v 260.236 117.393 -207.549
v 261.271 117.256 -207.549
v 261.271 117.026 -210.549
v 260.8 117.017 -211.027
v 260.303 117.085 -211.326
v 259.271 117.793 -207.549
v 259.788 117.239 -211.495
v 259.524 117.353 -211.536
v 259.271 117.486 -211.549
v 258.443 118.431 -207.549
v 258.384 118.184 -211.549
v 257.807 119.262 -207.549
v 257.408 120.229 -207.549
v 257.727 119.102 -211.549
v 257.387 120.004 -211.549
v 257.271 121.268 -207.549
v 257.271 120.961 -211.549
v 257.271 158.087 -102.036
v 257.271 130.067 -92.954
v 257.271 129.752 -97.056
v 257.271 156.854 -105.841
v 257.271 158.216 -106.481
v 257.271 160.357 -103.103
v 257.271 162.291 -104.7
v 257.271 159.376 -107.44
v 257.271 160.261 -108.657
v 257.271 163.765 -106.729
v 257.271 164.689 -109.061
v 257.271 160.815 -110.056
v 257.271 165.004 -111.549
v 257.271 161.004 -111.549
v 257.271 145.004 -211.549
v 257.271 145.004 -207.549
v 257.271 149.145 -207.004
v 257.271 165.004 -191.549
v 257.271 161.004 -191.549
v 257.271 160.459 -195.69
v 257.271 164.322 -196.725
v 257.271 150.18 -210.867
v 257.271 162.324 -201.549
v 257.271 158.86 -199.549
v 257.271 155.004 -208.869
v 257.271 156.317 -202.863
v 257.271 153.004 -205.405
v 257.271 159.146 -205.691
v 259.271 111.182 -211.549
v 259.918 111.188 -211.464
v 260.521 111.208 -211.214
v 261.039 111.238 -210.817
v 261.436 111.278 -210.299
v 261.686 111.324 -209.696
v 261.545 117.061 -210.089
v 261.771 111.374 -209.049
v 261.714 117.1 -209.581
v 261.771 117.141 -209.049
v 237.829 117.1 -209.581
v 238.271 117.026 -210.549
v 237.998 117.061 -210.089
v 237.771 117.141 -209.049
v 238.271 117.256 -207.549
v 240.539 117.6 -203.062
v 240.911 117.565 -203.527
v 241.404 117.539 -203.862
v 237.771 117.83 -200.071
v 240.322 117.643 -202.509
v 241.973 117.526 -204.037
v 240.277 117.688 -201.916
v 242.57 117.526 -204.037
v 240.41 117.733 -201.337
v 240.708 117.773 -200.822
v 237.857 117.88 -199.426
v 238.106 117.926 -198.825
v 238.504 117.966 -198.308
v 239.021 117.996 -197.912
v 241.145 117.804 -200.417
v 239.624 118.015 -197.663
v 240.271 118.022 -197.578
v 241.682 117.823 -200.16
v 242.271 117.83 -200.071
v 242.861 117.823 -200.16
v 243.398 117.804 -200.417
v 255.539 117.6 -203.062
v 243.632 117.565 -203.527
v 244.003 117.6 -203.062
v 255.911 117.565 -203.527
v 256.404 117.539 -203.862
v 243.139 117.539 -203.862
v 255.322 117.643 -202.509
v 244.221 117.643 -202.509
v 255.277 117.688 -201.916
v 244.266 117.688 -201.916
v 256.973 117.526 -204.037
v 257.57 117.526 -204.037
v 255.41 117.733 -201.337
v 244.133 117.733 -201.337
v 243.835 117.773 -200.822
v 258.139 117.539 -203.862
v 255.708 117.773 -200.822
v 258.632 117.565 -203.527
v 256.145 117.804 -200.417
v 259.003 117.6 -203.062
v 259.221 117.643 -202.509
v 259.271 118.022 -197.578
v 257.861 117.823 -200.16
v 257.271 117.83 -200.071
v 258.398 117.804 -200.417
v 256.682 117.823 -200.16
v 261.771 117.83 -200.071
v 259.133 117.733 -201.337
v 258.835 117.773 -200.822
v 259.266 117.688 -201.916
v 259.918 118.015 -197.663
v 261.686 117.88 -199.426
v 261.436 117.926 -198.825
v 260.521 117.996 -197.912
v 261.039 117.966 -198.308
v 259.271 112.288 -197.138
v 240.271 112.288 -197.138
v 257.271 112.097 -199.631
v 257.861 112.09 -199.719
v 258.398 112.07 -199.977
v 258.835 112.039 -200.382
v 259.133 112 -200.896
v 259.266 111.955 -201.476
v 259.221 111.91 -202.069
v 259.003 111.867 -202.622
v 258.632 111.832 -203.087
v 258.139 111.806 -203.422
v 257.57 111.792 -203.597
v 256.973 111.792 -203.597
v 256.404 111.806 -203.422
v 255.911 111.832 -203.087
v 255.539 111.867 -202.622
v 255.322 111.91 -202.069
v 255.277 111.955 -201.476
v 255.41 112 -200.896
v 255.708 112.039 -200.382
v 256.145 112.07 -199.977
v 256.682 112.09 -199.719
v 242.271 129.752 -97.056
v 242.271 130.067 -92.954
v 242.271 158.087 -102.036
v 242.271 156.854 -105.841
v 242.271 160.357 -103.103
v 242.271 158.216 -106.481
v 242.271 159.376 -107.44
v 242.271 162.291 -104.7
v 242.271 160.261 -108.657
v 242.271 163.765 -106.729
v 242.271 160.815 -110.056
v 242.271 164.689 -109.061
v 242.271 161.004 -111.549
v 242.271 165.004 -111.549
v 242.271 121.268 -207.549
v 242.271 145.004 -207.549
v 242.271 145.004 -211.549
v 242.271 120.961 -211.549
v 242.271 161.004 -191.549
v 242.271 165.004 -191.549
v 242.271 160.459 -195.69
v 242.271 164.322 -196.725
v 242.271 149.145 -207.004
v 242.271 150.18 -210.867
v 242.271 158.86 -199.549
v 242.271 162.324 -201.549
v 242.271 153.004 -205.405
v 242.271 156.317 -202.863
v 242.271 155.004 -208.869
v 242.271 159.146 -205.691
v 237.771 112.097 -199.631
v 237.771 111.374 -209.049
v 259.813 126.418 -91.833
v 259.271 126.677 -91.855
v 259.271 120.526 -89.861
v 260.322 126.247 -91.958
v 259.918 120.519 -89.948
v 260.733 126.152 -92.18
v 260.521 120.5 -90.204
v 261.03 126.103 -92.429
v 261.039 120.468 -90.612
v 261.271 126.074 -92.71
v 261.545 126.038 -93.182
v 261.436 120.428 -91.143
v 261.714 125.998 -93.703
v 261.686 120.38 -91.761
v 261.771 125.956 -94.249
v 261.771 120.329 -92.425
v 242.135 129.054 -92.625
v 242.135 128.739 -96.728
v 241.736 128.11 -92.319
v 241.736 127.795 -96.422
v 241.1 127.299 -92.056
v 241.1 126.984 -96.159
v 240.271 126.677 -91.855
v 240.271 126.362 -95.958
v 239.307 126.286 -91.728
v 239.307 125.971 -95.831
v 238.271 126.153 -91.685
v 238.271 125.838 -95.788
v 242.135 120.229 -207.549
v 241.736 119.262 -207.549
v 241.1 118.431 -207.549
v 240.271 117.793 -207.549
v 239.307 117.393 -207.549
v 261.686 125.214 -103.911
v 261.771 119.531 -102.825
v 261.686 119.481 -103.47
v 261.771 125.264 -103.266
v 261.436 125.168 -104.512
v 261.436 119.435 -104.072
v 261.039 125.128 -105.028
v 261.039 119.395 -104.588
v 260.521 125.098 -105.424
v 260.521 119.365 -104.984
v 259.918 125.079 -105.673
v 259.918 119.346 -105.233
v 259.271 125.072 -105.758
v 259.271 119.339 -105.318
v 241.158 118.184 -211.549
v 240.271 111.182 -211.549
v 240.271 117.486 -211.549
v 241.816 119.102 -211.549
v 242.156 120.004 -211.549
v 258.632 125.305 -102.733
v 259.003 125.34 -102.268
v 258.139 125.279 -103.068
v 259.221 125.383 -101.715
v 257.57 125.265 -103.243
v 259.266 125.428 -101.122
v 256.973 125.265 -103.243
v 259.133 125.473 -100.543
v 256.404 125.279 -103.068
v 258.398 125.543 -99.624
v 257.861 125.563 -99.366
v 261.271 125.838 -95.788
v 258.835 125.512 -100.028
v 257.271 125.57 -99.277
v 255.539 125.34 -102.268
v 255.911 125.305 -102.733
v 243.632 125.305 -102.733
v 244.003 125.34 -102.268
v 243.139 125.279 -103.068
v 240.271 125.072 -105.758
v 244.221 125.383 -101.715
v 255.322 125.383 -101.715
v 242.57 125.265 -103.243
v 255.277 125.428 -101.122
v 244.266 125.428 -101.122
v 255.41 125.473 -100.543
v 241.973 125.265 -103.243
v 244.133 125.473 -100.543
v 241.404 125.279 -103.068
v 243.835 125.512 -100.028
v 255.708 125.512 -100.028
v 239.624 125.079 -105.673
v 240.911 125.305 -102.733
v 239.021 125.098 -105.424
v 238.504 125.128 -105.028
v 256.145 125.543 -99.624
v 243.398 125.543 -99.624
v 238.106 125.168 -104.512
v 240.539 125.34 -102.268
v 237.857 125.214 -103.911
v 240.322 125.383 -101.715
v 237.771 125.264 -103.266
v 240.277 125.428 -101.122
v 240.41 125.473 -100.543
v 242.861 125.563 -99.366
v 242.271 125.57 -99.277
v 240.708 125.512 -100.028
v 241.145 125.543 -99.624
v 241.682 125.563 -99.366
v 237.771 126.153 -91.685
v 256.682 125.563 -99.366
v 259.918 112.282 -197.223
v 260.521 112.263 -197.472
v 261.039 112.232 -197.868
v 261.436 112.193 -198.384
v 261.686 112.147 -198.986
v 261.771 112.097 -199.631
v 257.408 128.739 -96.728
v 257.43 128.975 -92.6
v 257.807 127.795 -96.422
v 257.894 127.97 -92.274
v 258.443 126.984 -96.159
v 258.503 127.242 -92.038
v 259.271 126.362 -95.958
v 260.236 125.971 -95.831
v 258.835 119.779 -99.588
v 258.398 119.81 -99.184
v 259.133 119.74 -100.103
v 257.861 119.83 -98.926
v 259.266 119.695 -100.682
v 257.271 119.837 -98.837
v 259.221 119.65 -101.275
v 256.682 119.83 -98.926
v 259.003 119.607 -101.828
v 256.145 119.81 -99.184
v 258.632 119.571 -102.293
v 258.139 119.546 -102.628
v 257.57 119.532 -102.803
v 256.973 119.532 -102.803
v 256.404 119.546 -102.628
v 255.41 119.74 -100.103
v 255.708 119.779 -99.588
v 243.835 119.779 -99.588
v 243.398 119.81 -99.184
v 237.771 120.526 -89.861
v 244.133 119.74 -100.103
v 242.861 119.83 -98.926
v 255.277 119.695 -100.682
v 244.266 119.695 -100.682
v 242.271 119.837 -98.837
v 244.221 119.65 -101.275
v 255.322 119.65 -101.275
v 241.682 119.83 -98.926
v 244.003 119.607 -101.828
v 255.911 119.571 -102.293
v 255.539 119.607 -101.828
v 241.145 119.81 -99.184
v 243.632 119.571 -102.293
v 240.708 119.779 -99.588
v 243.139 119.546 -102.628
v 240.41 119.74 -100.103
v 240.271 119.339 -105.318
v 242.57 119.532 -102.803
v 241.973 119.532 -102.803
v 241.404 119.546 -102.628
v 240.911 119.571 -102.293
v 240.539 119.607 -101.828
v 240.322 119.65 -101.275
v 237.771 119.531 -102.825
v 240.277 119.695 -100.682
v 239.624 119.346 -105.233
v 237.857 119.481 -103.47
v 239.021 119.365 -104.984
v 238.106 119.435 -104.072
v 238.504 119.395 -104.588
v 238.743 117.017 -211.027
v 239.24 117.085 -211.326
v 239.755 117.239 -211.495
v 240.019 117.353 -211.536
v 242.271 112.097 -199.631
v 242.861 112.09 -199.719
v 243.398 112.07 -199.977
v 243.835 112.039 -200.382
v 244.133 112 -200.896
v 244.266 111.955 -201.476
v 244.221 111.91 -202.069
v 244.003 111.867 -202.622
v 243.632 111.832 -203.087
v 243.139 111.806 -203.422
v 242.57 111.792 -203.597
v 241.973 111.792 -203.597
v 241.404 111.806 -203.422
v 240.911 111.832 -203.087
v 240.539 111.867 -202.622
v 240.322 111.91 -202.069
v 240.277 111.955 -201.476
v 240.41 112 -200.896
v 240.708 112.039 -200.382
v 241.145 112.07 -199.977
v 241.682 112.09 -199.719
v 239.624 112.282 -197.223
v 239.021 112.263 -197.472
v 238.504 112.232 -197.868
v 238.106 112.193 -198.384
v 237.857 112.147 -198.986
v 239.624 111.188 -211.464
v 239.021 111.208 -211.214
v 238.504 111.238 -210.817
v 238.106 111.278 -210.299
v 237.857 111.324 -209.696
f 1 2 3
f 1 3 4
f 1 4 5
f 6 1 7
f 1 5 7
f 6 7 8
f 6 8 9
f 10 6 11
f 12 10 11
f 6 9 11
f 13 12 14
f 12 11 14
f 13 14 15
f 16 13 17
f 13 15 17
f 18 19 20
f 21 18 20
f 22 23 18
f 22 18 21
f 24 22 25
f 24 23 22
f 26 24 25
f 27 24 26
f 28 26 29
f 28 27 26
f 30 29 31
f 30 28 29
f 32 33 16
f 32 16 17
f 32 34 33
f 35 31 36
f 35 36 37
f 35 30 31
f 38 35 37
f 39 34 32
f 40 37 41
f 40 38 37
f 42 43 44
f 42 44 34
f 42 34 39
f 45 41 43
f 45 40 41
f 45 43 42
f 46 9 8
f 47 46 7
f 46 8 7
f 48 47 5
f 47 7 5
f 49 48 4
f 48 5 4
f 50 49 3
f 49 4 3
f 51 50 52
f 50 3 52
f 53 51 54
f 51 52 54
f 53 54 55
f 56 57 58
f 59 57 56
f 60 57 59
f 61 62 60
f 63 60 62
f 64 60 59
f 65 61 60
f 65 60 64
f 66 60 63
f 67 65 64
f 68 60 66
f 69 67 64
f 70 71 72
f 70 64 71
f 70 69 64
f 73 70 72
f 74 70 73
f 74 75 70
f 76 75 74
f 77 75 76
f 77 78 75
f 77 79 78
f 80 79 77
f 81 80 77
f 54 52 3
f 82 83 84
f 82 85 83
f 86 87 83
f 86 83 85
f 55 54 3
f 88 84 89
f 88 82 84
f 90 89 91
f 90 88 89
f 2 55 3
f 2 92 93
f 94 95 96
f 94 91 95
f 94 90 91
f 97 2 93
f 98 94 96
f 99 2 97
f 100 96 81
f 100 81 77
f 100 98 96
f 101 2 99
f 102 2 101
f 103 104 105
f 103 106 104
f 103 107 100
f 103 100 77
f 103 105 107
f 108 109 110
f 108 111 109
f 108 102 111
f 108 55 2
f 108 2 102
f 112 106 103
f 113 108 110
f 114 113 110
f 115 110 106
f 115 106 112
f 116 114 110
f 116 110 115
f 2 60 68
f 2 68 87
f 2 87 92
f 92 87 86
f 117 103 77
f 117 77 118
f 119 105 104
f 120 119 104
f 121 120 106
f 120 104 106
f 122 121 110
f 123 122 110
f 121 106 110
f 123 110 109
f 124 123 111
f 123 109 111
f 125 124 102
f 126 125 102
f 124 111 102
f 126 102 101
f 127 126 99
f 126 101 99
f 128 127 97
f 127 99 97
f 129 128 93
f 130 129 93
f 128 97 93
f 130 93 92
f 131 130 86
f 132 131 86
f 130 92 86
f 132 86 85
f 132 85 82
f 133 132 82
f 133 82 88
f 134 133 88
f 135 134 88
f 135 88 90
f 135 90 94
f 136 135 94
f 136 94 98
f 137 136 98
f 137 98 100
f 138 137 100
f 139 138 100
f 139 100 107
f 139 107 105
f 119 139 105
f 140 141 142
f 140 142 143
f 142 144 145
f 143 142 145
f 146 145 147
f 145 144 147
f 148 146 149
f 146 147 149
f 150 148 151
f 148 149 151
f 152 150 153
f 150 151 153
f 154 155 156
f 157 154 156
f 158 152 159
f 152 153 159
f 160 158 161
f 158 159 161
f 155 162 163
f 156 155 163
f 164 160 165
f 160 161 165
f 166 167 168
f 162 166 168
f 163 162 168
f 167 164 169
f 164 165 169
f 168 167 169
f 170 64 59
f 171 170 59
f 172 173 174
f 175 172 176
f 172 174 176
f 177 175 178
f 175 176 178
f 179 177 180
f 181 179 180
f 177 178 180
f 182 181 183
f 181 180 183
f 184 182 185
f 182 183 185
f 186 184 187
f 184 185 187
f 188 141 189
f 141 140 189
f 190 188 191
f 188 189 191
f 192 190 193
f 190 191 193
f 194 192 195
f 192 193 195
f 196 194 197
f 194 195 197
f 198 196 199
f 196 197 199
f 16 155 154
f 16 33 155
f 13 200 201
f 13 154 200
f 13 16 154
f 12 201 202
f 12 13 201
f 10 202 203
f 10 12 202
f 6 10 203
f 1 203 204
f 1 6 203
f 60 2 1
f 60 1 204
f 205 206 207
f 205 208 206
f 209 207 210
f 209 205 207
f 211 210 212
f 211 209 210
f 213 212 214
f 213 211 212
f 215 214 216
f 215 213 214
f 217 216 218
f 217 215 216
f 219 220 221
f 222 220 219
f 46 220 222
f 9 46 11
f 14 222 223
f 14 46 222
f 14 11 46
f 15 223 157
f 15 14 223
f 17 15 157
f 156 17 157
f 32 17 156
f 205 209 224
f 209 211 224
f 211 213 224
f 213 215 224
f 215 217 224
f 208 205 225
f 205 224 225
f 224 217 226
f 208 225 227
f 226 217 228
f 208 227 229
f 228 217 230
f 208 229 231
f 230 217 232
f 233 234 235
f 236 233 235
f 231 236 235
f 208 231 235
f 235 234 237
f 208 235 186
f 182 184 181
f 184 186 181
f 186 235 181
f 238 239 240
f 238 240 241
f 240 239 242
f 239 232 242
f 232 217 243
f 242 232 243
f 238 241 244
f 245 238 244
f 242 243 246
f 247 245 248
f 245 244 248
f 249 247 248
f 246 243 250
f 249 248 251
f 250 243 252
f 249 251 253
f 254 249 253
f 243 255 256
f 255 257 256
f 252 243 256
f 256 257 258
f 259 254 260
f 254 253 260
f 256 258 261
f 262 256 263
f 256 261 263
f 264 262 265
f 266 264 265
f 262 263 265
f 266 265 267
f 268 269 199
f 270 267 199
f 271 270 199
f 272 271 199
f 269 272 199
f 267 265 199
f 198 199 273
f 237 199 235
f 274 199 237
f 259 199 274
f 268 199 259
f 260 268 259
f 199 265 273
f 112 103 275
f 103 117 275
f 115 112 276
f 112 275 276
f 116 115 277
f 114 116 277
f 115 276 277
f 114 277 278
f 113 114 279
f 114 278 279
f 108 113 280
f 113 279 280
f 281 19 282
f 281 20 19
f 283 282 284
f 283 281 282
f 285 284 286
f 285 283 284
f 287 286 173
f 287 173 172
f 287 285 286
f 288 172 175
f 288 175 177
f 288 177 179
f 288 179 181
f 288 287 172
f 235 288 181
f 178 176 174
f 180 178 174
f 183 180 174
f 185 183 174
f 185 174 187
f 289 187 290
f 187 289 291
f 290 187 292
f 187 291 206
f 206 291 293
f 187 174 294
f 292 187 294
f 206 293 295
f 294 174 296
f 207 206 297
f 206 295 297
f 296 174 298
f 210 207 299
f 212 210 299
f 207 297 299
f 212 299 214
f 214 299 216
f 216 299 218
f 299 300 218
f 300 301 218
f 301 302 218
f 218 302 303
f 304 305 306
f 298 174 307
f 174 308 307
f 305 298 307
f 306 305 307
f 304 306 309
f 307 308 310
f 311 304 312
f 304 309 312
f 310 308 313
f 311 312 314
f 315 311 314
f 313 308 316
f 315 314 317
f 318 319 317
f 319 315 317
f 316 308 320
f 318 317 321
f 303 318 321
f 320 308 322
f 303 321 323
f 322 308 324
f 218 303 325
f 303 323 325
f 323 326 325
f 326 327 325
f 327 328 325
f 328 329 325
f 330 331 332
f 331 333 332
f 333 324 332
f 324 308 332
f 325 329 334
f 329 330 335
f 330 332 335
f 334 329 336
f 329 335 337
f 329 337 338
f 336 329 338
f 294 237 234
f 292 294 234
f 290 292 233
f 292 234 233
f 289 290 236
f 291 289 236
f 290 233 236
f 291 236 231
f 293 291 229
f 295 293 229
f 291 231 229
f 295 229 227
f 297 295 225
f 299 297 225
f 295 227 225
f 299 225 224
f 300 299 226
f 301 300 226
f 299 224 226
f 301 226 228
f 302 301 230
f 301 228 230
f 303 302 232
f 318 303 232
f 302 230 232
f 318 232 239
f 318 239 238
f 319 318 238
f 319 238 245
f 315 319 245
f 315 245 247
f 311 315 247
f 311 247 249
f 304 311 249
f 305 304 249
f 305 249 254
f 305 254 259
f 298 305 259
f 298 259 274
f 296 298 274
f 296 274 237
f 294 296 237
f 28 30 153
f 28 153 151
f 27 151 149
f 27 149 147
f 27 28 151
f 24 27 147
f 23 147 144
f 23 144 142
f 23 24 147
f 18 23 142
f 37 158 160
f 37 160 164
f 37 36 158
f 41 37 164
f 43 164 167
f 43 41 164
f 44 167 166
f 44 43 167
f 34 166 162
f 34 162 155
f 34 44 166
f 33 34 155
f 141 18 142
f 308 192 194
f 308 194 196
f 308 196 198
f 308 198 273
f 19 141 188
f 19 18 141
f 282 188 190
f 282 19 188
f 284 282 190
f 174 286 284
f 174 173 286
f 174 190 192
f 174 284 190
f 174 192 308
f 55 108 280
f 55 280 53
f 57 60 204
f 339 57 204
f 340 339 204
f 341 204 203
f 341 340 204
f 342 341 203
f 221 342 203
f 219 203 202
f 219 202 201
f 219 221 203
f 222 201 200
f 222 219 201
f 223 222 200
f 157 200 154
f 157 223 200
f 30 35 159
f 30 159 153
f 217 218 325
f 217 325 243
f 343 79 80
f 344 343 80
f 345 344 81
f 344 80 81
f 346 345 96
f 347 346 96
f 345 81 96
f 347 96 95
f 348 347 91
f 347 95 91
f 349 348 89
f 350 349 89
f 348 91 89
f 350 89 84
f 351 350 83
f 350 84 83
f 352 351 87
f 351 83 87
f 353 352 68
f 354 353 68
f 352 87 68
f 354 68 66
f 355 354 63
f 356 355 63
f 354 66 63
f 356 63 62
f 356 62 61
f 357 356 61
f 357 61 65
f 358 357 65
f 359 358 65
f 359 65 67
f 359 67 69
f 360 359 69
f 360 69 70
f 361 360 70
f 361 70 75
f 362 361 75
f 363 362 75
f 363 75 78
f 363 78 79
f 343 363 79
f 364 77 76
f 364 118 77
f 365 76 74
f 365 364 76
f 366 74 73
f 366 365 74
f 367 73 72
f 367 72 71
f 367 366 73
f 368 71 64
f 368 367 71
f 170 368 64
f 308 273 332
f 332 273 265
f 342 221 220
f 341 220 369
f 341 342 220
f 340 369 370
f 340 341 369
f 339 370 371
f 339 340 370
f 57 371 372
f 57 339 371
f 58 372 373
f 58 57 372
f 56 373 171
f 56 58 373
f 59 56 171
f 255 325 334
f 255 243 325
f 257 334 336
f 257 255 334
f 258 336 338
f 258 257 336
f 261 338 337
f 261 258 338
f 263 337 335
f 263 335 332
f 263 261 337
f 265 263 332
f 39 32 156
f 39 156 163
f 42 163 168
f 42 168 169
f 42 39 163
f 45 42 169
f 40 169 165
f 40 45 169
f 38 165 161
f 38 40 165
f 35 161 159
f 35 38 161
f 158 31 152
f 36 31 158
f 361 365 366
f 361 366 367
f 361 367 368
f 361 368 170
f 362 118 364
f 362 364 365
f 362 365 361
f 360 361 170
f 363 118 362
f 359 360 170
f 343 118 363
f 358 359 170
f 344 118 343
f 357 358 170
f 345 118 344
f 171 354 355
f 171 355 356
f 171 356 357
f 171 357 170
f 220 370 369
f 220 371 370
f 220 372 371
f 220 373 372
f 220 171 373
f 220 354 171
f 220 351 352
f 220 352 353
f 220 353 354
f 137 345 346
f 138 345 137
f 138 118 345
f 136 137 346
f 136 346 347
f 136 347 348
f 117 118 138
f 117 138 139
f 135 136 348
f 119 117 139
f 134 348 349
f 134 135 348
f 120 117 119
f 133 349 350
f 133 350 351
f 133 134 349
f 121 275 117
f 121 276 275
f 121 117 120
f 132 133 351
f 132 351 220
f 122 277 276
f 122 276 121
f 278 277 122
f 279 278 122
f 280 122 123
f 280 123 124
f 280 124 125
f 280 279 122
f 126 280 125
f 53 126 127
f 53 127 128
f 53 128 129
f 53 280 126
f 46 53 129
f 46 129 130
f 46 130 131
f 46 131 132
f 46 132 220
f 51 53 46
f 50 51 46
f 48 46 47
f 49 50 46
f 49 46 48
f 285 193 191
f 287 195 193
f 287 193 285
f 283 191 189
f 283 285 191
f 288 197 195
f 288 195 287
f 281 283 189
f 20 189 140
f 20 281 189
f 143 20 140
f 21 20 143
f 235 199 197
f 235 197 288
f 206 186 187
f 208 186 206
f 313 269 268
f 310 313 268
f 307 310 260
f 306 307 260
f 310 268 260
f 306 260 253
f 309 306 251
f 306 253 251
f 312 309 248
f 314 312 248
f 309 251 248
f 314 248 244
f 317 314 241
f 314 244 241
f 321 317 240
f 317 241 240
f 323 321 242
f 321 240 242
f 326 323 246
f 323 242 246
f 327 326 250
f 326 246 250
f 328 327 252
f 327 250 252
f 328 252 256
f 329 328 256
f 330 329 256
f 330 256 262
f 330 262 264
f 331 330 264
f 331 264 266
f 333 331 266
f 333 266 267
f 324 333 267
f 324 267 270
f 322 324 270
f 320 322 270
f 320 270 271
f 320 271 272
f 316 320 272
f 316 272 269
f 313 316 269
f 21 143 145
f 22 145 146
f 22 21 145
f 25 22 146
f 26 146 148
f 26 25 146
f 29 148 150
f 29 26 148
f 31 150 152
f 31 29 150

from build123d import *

# Parameters (mm, degrees)
BOSS_EXTRUDE1_DEPTH = 7.5
BOSS_EXTRUDE3_DEPTH = 12
FILLET1_R           = 2.5
FILLET2_R           = 4
CUT_EXTRUDE1_REACH  = 333.875
SKETCH5_R           = 2.0000000000001186
SKETCH5_R_2         = 2.0000000000001266
SKETCH5_R_3         = 2.0000000000001346


with BuildPart() as part:
    # Sketch1 → Boss-Extrude1 (new, symmetric)
    with BuildSketch(Plane(origin=(249.7714193313032, 90.19789758644944, 68.85838392138058), x_dir=(-1.36e-15, 0, -1), z_dir=(1, 1.23e-15, -1.36e-15))):
        with BuildLine():
            Line((276.40733700705005, 27.058032303601674), (280.40733700705005, 26.750876980739832))
            Line((280.40733700705005, 26.750876980739832), (280.40733700705005, 54.805859741005065))
            ThreePointArc((280.40733700705005, 54.80585974100506), (274.549472630781, 68.947995364736), (260.40733700705005, 74.80585974100505))
            Line((260.40733700705005, 74.80585974100507), (180.40733700705002, 74.80585974100505))
            ThreePointArc((180.40733700705002, 74.80585974100504), (174.52666621732683, 72.89398134388023), (170.89462091629855, 67.88940195358433))
            Line((170.89462091629855, 67.88940195358433), (158.7191888589005, 30.328239997775782))
            Line((158.7191888589005, 30.32823999777578), (162.8219643315265, 30.01319266654476))
            Line((162.8219643315265, 30.013192666544757), (174.69970735259915, 66.65598506855262))
            ThreePointArc((174.69970735259915, 66.65598506855262), (176.8789345332161, 69.65873270273018), (180.40733700705002, 70.80585974100507))
            Line((180.40733700705002, 70.80585974100505), (260.40733700705005, 70.80585974100507))
            ThreePointArc((260.40733700705005, 70.80585974100507), (271.7210455060348, 66.1195682399898), (276.40733700705005, 54.80585974100506))
            Line((276.40733700705005, 54.80585974100506), (276.40733700705005, 27.058032303601674))
        make_face()
    extrude(amount=BOSS_EXTRUDE1_DEPTH, both=True)

    # Sketch1<4> → Boss-Extrude3 (add, symmetric)
    with BuildSketch(Plane(origin=(249.7714193313032, 90.19789758644944, 68.85838392138058), x_dir=(-1.36e-15, 0, -1), z_dir=(1, 1.23e-15, -1.36e-15))):
        Polygon((174.61655820891, 34.87442718512688), (164.64591108515557, 35.64006151923646), (162.8219643315265, 30.01319266654476), (174.17631846679706, 29.14130508896809), align=None)
        Polygon((164.64591108515557, 35.64006151923646), (160.5431356125297, 35.95510885046747), (158.7191888589005, 30.328239997775782), (162.8219643315265, 30.01319266654476), align=None)
        Polygon((276.40733700705005, 21.291104712411546), (280.40733700705005, 20.983949389549675), (280.40733700705005, 26.750876980739832), (276.40733700705005, 27.058032303601674), align=None)
        Polygon((265.9964501411826, 22.090544541552422), (276.40733700705005, 21.291104712411546), (276.40733700705005, 27.058032303601674), (266.4366898832956, 27.823666637711245), align=None)
    extrude(amount=BOSS_EXTRUDE3_DEPTH, both=True)

    # Fillet1
    fillet1_edges = [part.edges().sort_by_distance(p)[0] for p in [
        (237.77141933130292, 122.20576372349691, -105.53805441647292),
        (261.7714193313029, 122.20576372349694, -105.53805441647295),
        (261.7714193313029, 123.33957201057109, -90.77277831433453),
        (261.7714193313028, 115.1550031760813, -197.35818609085857),
        (237.7714193313028, 114.06531077159418, -211.54895308566944),
        (261.7714193313028, 114.06531077159421, -211.5489530856695),
        (237.7714193313028, 115.15500317608127, -197.3581860908585),
    ]]
    fillet(fillet1_edges, radius=FILLET1_R)

    # Fillet2
    fillet2_edges = [part.edges().sort_by_distance(p)[0] for p in [
        (257.271419331303, 125.9954827713014, -93.73613942746209),
        (242.27141933130298, 125.99548277130137, -93.73613942746206),
        (242.2714193313028, 117.10235222862019, -209.54895308566944),
        (257.2714193313028, 117.10235222862022, -209.5489530856695),
    ]]
    fillet(fillet2_edges, radius=FILLET2_R)

    # Sketch5 → Cut-Extrude1 (cut, up to next)
    with BuildSketch(Plane(origin=(-1.7714e-13, 132.41259718729538, -10.16780851001), x_dir=(1, 1.33e-15, -1e-16), z_dir=(-1.3338661735596055e-15, 0.9970647123754437, -0.07656343341095512)), mode=Mode.PRIVATE) as cut_extrude1_sk1:
        with Locations(Location((242.271419331303, 192.46222063201034, 0), (0, 0, 270))):
            Circle(SKETCH5_R)
    cut_extrude1_tool1 = extrude(cut_extrude1_sk1.sketch, amount=-CUT_EXTRUDE1_REACH, mode=Mode.PRIVATE) & part.part
    # Sketch5 → Cut-Extrude1 (cut, up to next)
    with BuildSketch(Plane(origin=(-1.7714e-13, 132.41259718729538, -10.16780851001), x_dir=(1, 1.33e-15, -1e-16), z_dir=(-1.3338661735596055e-15, 0.9970647123754437, -0.07656343341095512)), mode=Mode.PRIVATE) as cut_extrude1_sk2:
        with Locations(Location((257.2714193313028, 192.46222063201034, 0), (0, 0, 270))):
            Circle(SKETCH5_R_2)
    cut_extrude1_tool2 = extrude(cut_extrude1_sk2.sketch, amount=-CUT_EXTRUDE1_REACH, mode=Mode.PRIVATE) & part.part
    # Sketch5 → Cut-Extrude1 (cut, up to next)
    with BuildSketch(Plane(origin=(-1.7714e-13, 132.41259718729538, -10.16780851001), x_dir=(1, 1.33e-15, -1e-16), z_dir=(-1.3338661735596055e-15, 0.9970647123754437, -0.07656343341095512)), mode=Mode.PRIVATE) as cut_extrude1_sk3:
        with Locations(Location((242.27141933130304, 91.37177701814517, 0), (0, 0, 270))):
            Circle(SKETCH5_R_3)
    cut_extrude1_tool3 = extrude(cut_extrude1_sk3.sketch, amount=-CUT_EXTRUDE1_REACH, mode=Mode.PRIVATE) & part.part
    # Sketch5 → Cut-Extrude1 (cut, up to next)
    with BuildSketch(Plane(origin=(-1.7714e-13, 132.41259718729538, -10.16780851001), x_dir=(1, 1.33e-15, -1e-16), z_dir=(-1.3338661735596055e-15, 0.9970647123754437, -0.07656343341095512)), mode=Mode.PRIVATE) as cut_extrude1_sk4:
        with Locations(Location((257.27141933130287, 91.37177701814517, 0), (0, 0, 270))):
            Circle(SKETCH5_R_3)
    cut_extrude1_tool4 = extrude(cut_extrude1_sk4.sketch, amount=-CUT_EXTRUDE1_REACH, mode=Mode.PRIVATE) & part.part
    add(cut_extrude1_tool1.solids().sort_by_distance((242.271419, 117.677029, -202.065097))[0], mode=Mode.SUBTRACT)
    add(cut_extrude1_tool2.solids().sort_by_distance((257.271419, 117.677029, -202.065097))[0], mode=Mode.SUBTRACT)
    add(cut_extrude1_tool3.solids().sort_by_distance((242.271419, 125.41686, -101.271383))[0], mode=Mode.SUBTRACT)
    add(cut_extrude1_tool4.solids().sort_by_distance((257.271419, 125.41686, -101.271383))[0], mode=Mode.SUBTRACT)


solid = part.part
